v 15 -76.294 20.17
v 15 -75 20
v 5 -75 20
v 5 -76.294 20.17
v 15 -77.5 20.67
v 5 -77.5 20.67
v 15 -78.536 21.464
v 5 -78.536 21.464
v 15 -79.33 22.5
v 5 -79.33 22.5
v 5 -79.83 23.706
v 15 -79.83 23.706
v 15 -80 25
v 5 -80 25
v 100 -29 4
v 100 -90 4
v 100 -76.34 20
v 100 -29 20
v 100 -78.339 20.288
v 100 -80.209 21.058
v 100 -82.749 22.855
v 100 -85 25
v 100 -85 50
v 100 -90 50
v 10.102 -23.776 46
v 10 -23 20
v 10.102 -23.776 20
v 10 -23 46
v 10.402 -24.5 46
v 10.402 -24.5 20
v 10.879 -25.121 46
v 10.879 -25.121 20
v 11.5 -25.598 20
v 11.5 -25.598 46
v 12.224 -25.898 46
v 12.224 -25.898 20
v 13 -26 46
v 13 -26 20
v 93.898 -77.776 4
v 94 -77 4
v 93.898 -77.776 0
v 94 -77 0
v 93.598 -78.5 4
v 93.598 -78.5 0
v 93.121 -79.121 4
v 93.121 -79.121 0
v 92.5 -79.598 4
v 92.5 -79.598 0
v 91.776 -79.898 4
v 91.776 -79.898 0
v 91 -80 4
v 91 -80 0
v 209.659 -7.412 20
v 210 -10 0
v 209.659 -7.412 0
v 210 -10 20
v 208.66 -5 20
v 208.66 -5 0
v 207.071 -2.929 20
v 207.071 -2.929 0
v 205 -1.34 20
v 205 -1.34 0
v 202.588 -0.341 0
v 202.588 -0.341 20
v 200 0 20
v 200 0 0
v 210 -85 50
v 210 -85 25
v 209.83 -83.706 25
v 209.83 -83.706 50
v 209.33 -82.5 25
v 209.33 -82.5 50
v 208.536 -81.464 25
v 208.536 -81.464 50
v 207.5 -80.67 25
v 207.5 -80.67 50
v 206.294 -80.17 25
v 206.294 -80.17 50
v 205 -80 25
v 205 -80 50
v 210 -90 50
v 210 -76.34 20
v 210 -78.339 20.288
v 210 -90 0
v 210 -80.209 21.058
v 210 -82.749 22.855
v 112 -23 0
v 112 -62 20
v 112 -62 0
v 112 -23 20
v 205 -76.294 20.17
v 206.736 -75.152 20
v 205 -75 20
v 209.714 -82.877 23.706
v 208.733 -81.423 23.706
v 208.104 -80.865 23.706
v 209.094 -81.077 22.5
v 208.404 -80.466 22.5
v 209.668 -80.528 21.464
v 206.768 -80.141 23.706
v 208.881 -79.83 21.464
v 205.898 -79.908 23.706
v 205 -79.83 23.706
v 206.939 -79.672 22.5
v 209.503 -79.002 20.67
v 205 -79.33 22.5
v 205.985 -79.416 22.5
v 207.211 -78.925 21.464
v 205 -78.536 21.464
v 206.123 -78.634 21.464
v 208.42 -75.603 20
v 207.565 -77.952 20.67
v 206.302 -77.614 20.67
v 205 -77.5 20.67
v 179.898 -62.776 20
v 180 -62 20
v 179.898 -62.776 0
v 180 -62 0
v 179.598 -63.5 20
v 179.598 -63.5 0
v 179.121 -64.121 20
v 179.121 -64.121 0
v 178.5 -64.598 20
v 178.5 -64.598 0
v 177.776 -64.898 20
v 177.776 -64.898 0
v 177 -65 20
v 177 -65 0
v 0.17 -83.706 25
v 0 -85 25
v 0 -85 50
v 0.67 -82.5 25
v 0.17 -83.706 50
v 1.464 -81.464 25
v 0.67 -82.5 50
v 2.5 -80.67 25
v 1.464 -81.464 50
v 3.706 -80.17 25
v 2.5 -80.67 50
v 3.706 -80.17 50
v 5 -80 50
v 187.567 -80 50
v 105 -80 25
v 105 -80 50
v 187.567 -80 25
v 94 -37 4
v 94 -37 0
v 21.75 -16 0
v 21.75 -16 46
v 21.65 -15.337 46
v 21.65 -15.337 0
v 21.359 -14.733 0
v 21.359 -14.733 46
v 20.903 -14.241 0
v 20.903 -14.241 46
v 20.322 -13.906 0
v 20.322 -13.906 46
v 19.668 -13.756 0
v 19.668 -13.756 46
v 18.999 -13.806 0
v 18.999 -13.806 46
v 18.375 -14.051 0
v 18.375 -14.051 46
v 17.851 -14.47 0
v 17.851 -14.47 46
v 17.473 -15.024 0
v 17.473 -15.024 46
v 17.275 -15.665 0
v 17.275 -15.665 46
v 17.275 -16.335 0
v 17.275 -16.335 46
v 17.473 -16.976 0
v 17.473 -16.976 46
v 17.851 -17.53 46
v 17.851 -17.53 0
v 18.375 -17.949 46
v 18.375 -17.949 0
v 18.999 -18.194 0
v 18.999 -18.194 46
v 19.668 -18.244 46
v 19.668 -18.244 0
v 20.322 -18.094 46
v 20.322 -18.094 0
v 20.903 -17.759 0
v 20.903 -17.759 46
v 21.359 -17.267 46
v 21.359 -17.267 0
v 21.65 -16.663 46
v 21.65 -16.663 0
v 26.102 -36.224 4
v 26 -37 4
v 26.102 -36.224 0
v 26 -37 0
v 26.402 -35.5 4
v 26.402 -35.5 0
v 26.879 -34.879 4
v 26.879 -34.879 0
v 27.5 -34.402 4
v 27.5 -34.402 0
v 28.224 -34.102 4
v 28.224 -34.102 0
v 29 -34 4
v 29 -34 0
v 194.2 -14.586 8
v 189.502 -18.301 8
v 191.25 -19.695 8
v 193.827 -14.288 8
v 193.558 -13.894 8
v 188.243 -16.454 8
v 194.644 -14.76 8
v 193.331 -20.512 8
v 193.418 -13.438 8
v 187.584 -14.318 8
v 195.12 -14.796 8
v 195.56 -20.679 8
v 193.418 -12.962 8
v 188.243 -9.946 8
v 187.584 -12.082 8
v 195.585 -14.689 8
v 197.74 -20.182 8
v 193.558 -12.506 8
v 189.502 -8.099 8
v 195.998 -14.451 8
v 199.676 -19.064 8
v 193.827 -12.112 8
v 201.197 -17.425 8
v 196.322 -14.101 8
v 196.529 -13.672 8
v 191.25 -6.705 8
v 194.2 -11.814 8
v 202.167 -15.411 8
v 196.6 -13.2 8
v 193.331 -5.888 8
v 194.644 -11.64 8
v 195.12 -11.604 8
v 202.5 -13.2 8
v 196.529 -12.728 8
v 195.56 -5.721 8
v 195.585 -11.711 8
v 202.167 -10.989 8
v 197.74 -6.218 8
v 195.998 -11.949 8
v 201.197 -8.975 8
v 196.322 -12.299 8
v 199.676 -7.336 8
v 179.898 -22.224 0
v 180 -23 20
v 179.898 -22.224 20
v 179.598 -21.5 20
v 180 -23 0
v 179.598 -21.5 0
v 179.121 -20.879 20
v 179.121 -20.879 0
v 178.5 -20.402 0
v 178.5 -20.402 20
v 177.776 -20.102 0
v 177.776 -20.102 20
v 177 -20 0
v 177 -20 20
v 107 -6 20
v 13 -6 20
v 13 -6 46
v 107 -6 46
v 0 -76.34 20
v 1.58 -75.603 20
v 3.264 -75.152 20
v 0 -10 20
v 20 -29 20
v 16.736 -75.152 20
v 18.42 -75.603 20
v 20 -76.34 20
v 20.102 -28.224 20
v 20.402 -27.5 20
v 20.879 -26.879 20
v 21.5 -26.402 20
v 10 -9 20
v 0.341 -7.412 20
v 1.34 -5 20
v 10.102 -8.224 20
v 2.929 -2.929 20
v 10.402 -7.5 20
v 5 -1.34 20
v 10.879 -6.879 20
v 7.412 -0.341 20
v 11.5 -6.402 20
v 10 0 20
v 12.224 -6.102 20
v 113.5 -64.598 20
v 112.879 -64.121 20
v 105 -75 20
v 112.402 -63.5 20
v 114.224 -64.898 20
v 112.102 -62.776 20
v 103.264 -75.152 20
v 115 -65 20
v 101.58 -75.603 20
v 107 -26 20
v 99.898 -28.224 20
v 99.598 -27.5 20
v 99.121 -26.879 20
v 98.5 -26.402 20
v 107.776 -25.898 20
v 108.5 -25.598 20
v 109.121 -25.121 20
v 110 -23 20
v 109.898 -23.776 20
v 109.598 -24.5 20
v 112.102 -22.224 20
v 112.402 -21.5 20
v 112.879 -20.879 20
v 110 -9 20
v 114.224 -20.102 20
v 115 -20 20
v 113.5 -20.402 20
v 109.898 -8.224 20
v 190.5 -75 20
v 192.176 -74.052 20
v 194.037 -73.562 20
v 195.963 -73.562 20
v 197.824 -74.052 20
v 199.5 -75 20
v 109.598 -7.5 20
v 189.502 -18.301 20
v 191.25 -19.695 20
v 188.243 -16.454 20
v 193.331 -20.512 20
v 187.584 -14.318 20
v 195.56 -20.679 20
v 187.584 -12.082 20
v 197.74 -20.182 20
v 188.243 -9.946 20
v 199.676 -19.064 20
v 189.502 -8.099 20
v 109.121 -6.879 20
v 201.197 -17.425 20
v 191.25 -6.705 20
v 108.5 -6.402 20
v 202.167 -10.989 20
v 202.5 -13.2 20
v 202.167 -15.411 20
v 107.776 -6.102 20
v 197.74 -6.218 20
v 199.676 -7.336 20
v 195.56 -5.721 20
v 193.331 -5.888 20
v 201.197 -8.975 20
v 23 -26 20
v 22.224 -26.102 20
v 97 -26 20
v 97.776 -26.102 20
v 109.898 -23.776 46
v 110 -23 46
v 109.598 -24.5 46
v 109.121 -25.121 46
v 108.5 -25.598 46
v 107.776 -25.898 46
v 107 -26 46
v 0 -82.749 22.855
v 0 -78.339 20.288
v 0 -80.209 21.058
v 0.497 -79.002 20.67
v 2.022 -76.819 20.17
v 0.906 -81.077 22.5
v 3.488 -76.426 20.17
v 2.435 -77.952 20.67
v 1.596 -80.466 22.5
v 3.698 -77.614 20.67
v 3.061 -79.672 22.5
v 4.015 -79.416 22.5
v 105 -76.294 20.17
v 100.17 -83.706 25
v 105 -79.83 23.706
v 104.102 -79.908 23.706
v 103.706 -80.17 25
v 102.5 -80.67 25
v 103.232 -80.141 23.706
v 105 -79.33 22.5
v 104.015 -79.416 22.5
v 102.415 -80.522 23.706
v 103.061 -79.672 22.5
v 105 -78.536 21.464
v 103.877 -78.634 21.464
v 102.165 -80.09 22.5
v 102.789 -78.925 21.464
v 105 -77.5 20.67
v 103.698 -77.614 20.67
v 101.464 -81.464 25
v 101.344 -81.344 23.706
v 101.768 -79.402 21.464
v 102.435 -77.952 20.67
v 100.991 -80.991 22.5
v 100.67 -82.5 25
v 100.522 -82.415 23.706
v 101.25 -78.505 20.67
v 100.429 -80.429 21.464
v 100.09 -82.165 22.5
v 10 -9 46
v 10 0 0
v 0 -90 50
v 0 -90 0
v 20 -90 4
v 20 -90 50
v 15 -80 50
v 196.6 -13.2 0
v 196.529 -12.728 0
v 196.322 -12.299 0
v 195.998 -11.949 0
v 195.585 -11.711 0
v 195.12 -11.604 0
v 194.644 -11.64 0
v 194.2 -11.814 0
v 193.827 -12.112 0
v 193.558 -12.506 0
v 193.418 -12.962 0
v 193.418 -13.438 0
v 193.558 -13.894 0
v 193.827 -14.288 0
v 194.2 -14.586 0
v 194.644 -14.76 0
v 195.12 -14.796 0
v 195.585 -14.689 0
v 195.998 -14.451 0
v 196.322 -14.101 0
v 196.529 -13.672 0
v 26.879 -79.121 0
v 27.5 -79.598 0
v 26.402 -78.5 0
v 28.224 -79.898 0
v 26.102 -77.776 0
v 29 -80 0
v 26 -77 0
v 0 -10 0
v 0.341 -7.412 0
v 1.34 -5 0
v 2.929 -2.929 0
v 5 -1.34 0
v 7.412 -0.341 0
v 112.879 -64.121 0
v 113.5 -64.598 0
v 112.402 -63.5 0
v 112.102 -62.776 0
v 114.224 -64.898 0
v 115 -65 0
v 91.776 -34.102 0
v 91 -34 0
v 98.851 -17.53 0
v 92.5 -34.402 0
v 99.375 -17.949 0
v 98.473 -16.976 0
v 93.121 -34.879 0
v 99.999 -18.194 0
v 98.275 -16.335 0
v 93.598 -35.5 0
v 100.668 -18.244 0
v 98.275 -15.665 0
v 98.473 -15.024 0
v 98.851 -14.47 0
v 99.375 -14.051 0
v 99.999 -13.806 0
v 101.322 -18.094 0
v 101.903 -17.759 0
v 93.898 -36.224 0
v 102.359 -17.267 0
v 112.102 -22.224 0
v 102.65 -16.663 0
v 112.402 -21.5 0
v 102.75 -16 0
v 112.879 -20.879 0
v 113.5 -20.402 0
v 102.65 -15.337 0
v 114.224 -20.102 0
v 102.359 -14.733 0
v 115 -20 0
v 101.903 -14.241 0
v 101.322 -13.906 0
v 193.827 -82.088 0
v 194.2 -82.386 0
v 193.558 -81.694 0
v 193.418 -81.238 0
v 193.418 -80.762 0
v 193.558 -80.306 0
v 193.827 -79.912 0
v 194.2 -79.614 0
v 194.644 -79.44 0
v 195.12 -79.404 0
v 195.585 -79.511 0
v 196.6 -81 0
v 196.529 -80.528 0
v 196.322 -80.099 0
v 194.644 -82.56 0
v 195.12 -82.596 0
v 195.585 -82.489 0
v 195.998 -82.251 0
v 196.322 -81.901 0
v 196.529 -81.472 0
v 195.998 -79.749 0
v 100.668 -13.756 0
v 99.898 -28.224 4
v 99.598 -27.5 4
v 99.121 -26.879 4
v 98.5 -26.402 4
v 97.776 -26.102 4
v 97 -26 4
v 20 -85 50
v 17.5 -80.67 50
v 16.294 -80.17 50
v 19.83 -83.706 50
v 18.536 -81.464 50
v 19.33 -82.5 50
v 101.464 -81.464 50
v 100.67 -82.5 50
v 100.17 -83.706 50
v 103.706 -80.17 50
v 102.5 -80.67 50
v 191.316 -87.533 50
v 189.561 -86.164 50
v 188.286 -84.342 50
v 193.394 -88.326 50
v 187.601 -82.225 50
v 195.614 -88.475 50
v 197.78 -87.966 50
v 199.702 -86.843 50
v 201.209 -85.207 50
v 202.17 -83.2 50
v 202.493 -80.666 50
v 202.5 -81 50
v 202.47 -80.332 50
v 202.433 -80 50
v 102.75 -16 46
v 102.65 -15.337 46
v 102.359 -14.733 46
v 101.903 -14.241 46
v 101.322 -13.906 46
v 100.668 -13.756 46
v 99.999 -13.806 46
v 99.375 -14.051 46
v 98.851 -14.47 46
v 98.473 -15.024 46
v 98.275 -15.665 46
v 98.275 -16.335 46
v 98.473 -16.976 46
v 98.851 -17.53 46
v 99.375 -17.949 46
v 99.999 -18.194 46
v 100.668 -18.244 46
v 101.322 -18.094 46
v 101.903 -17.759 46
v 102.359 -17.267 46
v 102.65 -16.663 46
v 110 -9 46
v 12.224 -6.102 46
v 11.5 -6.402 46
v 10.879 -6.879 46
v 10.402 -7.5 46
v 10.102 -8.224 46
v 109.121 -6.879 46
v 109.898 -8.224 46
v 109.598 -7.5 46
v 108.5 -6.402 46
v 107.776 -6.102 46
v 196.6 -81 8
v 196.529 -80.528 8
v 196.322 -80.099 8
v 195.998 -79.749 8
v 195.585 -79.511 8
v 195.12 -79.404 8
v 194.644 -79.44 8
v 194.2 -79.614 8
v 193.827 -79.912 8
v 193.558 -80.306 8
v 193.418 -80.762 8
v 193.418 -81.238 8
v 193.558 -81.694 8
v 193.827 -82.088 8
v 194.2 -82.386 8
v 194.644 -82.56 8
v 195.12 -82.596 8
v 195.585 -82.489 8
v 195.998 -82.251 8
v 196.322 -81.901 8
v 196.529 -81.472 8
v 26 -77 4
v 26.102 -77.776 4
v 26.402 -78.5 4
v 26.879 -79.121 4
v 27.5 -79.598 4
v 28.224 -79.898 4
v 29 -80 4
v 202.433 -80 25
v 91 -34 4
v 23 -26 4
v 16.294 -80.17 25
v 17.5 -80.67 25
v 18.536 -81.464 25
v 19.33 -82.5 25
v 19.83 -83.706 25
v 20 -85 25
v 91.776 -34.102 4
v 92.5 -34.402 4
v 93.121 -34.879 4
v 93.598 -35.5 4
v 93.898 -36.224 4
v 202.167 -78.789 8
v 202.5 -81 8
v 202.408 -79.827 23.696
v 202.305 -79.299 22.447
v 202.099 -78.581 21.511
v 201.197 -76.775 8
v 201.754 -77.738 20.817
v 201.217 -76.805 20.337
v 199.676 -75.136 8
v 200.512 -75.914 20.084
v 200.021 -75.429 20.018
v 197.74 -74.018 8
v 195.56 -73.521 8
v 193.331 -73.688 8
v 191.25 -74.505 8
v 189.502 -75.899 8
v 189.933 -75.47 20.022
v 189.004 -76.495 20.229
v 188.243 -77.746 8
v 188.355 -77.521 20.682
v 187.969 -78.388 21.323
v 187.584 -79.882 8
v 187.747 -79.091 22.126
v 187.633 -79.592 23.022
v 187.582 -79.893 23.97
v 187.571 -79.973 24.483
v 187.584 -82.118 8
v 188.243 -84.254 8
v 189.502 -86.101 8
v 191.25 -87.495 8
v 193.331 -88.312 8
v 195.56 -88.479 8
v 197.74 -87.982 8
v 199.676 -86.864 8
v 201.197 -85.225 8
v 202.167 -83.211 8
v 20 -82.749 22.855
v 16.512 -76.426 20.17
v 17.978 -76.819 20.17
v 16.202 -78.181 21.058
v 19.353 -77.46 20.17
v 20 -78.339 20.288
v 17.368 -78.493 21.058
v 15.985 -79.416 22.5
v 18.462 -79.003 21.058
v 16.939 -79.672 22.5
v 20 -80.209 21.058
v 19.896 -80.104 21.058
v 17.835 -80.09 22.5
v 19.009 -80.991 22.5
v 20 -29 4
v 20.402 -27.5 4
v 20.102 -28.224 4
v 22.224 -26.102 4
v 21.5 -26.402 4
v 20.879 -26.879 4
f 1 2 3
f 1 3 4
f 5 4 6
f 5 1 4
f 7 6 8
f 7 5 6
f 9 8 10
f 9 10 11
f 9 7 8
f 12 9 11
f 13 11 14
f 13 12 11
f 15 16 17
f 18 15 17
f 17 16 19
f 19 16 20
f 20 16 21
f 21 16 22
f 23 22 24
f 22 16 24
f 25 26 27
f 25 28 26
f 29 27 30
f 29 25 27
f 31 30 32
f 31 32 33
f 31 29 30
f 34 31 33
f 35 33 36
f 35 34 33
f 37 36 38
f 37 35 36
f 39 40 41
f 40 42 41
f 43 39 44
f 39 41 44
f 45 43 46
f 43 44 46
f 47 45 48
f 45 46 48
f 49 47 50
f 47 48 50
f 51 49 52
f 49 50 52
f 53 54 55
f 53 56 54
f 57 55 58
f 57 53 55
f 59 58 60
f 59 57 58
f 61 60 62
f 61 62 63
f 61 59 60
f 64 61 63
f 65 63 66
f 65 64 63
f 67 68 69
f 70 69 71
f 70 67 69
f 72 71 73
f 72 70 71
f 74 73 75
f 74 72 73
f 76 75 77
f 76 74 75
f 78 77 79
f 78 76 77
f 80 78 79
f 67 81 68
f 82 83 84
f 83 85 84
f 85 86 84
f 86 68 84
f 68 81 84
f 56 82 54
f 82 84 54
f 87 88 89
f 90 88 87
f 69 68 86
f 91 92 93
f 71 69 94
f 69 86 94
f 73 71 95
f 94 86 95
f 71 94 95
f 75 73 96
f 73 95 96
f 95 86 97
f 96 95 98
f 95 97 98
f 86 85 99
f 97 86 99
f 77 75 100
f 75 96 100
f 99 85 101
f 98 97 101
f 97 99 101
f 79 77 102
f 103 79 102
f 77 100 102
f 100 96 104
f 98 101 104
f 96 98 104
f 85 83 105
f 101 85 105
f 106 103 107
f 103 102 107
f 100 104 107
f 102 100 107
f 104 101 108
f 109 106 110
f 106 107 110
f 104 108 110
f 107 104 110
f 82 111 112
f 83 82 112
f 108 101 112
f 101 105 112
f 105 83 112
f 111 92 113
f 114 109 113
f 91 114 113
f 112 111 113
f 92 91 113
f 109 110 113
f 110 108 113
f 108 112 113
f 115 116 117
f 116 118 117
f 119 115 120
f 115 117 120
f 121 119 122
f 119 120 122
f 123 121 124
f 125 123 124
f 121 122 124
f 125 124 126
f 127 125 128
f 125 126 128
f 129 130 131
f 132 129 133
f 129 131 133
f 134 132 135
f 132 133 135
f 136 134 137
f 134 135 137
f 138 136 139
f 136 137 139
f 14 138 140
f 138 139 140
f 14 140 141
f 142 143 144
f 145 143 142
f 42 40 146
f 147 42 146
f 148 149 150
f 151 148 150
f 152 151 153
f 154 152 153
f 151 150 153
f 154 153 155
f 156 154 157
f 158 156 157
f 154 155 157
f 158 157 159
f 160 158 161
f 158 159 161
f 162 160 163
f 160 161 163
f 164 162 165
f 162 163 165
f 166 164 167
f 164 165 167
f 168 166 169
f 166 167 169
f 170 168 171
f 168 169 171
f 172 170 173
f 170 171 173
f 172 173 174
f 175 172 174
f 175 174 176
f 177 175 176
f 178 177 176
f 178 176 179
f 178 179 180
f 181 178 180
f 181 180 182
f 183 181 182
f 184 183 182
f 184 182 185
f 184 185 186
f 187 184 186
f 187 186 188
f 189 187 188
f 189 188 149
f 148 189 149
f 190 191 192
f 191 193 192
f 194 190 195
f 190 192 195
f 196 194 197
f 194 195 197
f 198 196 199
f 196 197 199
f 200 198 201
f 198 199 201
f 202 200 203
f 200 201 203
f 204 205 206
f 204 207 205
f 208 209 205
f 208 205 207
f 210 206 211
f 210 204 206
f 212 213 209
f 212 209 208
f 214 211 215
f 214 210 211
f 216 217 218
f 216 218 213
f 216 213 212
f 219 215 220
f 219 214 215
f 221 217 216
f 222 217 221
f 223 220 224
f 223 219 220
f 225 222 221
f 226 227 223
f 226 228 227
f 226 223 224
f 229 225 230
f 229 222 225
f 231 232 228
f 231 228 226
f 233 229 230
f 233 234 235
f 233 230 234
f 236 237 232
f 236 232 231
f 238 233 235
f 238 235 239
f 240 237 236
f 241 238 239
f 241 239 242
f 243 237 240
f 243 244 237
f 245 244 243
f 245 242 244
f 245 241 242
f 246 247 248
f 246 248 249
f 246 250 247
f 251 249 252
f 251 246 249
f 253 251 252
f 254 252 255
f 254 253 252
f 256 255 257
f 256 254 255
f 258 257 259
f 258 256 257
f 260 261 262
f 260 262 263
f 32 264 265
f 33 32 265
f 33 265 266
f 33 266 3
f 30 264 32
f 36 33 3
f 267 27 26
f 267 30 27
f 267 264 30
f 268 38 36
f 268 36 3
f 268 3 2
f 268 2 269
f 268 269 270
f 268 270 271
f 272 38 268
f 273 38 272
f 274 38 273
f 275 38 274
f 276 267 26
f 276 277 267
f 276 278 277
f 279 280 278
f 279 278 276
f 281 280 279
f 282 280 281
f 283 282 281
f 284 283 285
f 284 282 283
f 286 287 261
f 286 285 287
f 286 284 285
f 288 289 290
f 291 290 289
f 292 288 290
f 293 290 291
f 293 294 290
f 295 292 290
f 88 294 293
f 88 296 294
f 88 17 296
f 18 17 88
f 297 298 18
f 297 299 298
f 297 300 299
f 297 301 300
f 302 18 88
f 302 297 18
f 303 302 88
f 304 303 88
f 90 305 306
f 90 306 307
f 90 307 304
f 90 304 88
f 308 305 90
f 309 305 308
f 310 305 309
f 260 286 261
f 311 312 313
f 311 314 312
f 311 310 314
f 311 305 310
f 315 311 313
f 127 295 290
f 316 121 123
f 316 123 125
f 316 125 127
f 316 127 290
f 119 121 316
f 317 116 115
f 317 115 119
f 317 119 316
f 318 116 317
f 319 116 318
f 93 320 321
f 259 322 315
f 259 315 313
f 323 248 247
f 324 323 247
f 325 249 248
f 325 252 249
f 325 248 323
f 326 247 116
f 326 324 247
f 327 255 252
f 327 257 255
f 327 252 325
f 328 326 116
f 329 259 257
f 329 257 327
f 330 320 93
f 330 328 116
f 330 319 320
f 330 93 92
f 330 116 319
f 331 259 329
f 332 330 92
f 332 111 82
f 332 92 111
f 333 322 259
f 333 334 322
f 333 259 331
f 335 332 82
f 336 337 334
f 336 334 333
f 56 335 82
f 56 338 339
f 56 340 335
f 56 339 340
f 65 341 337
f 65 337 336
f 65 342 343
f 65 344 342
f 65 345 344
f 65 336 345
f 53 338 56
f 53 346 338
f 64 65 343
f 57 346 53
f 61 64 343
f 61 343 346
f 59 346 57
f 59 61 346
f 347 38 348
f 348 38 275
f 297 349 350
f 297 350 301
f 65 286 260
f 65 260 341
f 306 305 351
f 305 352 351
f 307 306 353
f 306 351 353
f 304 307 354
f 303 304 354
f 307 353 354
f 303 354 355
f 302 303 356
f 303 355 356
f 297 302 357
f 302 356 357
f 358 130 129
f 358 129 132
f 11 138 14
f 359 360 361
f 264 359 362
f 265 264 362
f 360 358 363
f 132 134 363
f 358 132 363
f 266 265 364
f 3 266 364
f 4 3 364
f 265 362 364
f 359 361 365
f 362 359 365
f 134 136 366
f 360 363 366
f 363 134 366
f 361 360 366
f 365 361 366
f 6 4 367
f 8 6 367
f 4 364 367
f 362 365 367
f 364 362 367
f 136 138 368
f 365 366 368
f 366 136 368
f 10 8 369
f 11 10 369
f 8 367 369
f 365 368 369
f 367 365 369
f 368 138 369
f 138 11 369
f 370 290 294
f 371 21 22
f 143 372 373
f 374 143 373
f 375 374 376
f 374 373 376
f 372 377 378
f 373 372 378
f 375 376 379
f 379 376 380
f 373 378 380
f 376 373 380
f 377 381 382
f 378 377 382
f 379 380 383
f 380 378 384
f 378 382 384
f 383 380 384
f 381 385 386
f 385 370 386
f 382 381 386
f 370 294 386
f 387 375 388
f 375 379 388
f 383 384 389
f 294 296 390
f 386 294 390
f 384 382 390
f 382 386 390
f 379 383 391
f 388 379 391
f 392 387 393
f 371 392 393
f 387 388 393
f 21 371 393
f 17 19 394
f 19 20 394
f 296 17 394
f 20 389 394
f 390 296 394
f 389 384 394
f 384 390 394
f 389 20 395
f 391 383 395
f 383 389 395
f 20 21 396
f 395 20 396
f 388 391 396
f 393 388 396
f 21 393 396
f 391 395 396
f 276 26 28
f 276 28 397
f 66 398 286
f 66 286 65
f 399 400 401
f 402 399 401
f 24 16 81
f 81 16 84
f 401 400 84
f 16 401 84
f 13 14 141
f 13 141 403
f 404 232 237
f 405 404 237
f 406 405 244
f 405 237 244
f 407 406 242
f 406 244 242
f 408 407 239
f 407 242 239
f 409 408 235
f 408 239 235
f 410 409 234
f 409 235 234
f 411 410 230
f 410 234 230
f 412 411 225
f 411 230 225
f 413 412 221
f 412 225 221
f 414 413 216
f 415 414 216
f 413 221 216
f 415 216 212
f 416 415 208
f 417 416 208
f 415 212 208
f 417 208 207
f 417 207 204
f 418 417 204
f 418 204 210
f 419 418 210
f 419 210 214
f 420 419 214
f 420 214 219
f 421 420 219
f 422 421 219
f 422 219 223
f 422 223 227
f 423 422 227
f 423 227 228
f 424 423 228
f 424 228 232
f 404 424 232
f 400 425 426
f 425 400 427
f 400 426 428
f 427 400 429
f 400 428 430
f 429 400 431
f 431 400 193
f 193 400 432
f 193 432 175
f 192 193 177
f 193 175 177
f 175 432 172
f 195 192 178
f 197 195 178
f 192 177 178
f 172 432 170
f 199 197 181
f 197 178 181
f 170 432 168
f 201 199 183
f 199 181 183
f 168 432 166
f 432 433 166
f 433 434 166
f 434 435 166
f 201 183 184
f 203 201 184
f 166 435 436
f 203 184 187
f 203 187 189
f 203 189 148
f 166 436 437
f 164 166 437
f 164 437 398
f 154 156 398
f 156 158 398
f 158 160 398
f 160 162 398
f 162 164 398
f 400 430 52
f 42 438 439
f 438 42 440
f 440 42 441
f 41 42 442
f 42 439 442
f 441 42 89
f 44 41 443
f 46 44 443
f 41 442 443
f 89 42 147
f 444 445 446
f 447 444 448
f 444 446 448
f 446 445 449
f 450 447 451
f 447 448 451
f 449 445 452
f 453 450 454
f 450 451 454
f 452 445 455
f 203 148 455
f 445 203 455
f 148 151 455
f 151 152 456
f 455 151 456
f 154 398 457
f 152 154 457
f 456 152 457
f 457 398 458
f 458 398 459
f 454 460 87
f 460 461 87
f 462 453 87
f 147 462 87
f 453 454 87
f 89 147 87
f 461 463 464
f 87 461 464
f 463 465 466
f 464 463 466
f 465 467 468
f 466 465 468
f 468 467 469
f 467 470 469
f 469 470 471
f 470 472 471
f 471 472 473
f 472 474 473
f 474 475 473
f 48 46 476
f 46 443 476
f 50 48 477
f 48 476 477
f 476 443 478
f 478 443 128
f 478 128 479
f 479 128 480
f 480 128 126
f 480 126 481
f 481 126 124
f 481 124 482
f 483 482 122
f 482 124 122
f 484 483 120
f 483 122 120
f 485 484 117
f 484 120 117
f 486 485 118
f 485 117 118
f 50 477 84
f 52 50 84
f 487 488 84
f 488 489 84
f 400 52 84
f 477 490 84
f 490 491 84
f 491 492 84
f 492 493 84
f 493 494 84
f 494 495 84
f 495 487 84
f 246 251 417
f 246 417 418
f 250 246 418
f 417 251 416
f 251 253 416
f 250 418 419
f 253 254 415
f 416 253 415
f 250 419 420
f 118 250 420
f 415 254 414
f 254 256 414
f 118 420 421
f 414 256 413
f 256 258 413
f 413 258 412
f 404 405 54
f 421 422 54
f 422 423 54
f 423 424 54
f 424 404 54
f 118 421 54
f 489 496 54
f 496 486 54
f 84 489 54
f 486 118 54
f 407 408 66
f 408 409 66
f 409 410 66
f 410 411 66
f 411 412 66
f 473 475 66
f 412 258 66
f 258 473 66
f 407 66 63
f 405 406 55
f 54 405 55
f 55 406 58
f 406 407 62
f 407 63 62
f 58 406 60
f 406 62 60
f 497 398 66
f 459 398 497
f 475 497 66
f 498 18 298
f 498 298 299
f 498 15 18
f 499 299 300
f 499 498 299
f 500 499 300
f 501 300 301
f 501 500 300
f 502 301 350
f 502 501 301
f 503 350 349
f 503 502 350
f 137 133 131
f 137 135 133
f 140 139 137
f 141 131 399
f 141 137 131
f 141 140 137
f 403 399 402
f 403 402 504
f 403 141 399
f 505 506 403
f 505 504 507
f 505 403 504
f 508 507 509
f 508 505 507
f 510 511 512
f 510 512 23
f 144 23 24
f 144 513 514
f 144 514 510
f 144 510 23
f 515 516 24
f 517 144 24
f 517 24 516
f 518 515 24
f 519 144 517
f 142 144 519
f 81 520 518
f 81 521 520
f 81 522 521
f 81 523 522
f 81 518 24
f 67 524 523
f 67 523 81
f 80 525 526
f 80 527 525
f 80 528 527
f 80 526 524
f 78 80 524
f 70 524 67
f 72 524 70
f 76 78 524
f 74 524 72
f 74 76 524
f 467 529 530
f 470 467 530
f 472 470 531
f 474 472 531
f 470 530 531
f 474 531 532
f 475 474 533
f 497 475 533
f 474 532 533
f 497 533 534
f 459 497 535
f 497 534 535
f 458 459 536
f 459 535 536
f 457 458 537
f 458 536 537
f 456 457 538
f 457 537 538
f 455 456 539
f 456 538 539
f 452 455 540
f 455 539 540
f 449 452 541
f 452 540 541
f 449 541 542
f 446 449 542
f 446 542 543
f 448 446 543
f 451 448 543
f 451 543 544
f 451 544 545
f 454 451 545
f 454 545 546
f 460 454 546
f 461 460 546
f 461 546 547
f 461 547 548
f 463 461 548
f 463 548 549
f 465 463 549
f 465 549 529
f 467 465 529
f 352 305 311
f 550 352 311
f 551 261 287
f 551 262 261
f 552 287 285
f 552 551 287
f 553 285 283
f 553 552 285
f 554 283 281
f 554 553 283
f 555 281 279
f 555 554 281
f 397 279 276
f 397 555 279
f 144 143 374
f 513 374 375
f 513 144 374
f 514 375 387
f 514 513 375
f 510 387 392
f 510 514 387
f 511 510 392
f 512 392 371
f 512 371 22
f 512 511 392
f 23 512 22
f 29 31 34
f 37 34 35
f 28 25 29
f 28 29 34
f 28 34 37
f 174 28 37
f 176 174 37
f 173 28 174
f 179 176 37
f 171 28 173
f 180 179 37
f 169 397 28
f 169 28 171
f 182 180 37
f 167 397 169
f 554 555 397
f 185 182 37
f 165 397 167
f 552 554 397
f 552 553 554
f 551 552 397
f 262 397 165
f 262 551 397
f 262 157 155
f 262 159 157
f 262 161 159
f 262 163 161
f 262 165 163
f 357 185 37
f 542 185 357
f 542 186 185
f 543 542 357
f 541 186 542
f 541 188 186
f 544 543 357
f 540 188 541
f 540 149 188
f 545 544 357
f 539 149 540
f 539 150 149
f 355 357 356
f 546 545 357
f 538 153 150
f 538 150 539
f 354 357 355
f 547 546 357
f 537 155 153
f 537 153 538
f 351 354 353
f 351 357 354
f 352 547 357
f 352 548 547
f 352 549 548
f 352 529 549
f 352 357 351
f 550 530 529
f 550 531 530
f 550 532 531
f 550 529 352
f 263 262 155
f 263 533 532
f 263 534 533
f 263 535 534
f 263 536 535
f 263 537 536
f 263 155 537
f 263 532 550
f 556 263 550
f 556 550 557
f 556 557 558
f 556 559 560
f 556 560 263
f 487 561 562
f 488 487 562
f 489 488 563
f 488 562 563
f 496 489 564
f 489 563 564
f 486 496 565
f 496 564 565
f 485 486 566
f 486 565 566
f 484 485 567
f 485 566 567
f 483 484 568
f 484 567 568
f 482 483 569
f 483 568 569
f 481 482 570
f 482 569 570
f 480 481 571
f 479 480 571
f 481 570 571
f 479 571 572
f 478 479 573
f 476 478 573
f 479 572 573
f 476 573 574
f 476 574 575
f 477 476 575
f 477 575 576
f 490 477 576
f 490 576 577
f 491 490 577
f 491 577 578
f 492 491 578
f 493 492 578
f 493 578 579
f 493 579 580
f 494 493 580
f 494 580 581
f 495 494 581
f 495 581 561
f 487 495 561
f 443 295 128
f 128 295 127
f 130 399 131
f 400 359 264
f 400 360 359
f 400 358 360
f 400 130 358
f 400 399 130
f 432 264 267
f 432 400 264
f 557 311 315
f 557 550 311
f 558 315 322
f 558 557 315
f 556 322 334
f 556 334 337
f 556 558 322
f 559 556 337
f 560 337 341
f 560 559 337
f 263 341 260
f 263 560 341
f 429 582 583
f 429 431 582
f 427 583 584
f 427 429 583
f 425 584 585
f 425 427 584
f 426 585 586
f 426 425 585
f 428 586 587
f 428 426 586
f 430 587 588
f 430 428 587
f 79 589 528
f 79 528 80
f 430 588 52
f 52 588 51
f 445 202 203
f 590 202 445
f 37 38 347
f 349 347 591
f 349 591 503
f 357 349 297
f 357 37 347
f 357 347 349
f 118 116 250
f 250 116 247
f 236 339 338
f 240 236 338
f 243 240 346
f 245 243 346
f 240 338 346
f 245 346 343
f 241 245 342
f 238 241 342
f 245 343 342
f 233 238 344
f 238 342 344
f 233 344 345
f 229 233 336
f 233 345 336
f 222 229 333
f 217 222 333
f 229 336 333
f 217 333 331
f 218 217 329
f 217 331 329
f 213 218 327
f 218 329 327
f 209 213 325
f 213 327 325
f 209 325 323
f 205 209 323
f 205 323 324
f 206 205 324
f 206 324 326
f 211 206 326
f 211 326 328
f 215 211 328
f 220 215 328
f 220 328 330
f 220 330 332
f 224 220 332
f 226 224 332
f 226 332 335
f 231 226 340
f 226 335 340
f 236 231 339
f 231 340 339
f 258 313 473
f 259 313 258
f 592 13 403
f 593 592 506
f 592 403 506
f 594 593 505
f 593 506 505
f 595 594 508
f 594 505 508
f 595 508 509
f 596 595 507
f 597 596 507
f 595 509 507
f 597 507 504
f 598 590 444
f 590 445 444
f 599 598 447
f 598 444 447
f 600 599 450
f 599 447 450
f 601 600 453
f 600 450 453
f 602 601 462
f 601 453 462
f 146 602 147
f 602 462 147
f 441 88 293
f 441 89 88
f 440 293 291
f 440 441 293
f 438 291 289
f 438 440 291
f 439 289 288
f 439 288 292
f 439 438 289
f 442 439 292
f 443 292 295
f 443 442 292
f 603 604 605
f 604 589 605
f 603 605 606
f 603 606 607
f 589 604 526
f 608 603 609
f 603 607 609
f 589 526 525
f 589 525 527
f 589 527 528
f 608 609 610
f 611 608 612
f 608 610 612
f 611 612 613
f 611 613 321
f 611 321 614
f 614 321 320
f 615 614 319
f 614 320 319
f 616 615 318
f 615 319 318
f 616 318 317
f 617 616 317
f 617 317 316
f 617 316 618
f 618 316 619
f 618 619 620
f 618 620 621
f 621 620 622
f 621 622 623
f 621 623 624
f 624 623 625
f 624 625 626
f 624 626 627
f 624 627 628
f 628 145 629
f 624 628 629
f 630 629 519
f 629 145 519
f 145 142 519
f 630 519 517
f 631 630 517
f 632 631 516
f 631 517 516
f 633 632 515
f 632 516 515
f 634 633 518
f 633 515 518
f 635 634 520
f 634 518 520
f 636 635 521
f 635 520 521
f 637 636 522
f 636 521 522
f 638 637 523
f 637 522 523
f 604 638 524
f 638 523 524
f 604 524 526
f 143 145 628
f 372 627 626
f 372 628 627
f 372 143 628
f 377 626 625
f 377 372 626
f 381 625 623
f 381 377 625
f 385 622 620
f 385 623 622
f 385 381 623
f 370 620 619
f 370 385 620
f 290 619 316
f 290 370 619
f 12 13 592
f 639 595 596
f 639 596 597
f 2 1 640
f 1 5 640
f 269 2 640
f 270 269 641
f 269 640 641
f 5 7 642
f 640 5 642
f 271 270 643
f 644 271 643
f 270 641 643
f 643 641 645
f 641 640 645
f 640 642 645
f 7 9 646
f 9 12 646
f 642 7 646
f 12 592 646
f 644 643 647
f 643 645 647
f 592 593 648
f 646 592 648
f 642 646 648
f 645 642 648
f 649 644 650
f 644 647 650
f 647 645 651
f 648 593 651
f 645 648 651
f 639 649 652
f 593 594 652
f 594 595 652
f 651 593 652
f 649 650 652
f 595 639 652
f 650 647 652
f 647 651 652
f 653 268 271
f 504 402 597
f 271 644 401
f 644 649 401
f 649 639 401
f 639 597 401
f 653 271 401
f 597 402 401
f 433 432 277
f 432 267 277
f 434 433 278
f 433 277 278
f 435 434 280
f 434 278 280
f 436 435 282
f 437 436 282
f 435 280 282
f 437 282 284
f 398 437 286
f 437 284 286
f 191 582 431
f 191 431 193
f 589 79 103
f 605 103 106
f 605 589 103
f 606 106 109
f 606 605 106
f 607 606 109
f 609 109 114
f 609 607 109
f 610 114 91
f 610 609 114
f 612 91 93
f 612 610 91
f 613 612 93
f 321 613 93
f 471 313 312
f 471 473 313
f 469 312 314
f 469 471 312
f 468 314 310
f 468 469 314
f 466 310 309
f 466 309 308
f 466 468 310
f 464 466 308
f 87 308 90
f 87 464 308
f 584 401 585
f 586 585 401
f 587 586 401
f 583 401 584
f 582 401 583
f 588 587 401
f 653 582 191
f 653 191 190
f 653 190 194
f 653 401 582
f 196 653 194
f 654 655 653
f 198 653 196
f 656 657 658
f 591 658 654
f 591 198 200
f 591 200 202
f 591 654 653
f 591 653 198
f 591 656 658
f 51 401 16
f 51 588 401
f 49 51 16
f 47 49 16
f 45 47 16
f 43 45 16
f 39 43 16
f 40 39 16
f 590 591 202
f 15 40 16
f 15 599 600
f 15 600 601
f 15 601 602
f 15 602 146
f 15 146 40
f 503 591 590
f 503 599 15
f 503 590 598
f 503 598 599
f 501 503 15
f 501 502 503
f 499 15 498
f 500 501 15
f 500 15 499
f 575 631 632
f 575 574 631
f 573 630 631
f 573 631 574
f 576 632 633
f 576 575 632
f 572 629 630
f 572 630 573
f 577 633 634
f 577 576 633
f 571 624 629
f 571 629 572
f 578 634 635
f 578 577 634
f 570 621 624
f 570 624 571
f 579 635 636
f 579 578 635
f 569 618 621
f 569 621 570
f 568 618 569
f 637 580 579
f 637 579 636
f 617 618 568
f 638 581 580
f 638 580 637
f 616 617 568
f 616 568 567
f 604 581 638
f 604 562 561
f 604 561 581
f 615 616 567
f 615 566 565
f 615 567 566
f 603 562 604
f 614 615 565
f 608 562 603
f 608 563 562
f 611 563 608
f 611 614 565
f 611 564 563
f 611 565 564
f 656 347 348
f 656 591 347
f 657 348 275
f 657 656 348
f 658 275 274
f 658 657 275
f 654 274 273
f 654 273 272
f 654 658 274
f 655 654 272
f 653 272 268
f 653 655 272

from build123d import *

# Parameters (mm, degrees)
SKETCH1_W           = 210
SKETCH1_H           = 90
BOSS_EXTRUDE1_DEPTH = 20
SKETCH2_R           = 1.6
CUT_EXTRUDE1_DEPTH  = 20
SKETCH3_W           = 110
SKETCH3_H           = 10
BOSS_EXTRUDE2_DEPTH = 30
SKETCH4_W           = 100
SKETCH4_H           = 20
BOSS_EXTRUDE3_DEPTH = 26
SKETCH5_R           = 2.25
CUT_EXTRUDE2_DEPTH  = 234.057932712
SKETCH7_W           = 80
SKETCH7_H           = 64
CUT_EXTRUDE3_DEPTH  = 16
SKETCH8_R           = 7.5
CUT_EXTRUDE4_DEPTH  = 12
SKETCH9_R           = 7.5
CUT_EXTRUDE5_DEPTH  = 42
SKETCH10_W          = 68
SKETCH10_H          = 45
CUT_EXTRUDE6_DEPTH  = 46
SKETCH11_W          = 20
SKETCH11_H          = 10
BOSS_EXTRUDE5_DEPTH = 30
FILLET1_R           = 10
SKETCH12_W          = 68
SKETCH12_H          = 46
CUT_EXTRUDE7_DEPTH  = 30
FILLET2_R           = 5
FILLET3_R           = 5
FILLET4_R           = 3
FILLET5_R           = 3


with BuildPart() as part:
    # Sketch1 → Boss-Extrude1 (new body)
    with BuildSketch(Plane.XY):
        with Locations((105, -45)):
            Rectangle(SKETCH1_W, SKETCH1_H)
    extrude(amount=BOSS_EXTRUDE1_DEPTH)

    # Sketch2 → Cut-Extrude1 (cut)
    with BuildSketch(Plane.XY.offset(20)):
        with Locations((195, -13.2)):
            Circle(SKETCH2_R)
        with Locations((195, -81)):
            Circle(SKETCH2_R)
    extrude(amount=-CUT_EXTRUDE1_DEPTH, mode=Mode.SUBTRACT)

    # Sketch3 → Boss-Extrude2 (add)
    with BuildSketch(Plane.XY.offset(20)):
        with Locations((155, -85)):
            Rectangle(SKETCH3_W, SKETCH3_H)
    extrude(amount=BOSS_EXTRUDE2_DEPTH)

    # Sketch4 → Boss-Extrude3 (add)
    with BuildSketch(Plane.XY.offset(20)):
        with Locations((60, -16)):
            Rectangle(SKETCH4_W, SKETCH4_H)
    extrude(amount=BOSS_EXTRUDE3_DEPTH)

    # Sketch5 → Cut-Extrude2 (cut, through all)
    with BuildSketch(Plane.XY.offset(46)):
        with Locations((100.5, -16)):
            Circle(SKETCH5_R)
        with Locations((19.5, -16)):
            Circle(SKETCH5_R)
    extrude(amount=-CUT_EXTRUDE2_DEPTH, mode=Mode.SUBTRACT)

    # Sketch7 → Cut-Extrude3 (cut)
    with BuildSketch(Plane.XY.offset(20)):
        with Locations((60, -58)):
            Rectangle(SKETCH7_W, SKETCH7_H)
    extrude(amount=-CUT_EXTRUDE3_DEPTH, mode=Mode.SUBTRACT)

    # Sketch8 → Cut-Extrude4 (cut)
    with BuildSketch(Plane.XY.offset(20)):
        with Locations((195, -13.2)):
            Circle(SKETCH8_R)
    extrude(amount=-CUT_EXTRUDE4_DEPTH, mode=Mode.SUBTRACT)

    # Sketch9 → Cut-Extrude5 (cut)
    with BuildSketch(Plane.XY.offset(50)):
        with Locations((195, -81)):
            Circle(SKETCH9_R)
    extrude(amount=-CUT_EXTRUDE5_DEPTH, mode=Mode.SUBTRACT)

    # Sketch10 → Cut-Extrude6 (cut)
    with BuildSketch(Plane.XY.offset(20)):
        with Locations((146, -42.5)):
            Rectangle(SKETCH10_W, SKETCH10_H)
    extrude(amount=-CUT_EXTRUDE6_DEPTH, mode=Mode.SUBTRACT)

    # Sketch11 → Boss-Extrude5 (add)
    with BuildSketch(Plane.XY.offset(20)):
        with Locations((10, -85)):
            Rectangle(SKETCH11_W, SKETCH11_H)
    extrude(amount=BOSS_EXTRUDE5_DEPTH)

    # Fillet1
    fillet1_edges = [part.edges().sort_by_distance(p)[0] for p in [
        (0, 0, 10),
        (210, 0, 10),
    ]]
    fillet(fillet1_edges, radius=FILLET1_R)

    # Sketch12 → Cut-Extrude7 (cut)
    with BuildSketch(Plane.XY.offset(4)):
        with Locations((60, -57)):
            Rectangle(SKETCH12_W, SKETCH12_H)
    extrude(amount=-CUT_EXTRUDE7_DEPTH, mode=Mode.SUBTRACT)

    # Fillet2
    fillet2_edges = [part.edges().sort_by_distance(p)[0] for p in [
        (0, -80, 35),
        (20, -80, 35),
        (210, -80, 35),
        (100, -80, 35),
    ]]
    fillet(fillet2_edges, radius=FILLET2_R)

    # Fillet3
    # the kernel refuses this fillet: 5 mm, written as the material it adds along each edge
    with BuildSketch(Plane(origin=(189.933034374, -80, 20), x_dir=(0, 1, 0), z_dir=(1, 0, 0))) as fillet3_piece_1_section:
        with BuildLine():
            CenterArc((FILLET3_R, FILLET3_R), FILLET3_R, 180, 90)
            Line((0, FILLET3_R), (0, 0))
            Line((0, 0), (FILLET3_R, 0))
        make_face()
    fillet3_piece_1 = extrude(amount=15.066965626, mode=Mode.PRIVATE)
    fillet3_piece_1 = fillet3_piece_1 - Plane(origin=(195, -81, 20.004383527), x_dir=(1, 0, 0), z_dir=(0, 0, 1)) * Cylinder(7.5, 51, mode=Mode.PRIVATE)
    add(fillet3_piece_1)
    with BuildSketch(Plane(origin=(15, -80, 20), x_dir=(0, 1, 0), z_dir=(-1, 0, 0))) as fillet3_piece_2:
        with BuildLine():
            CenterArc((FILLET3_R, -FILLET3_R), FILLET3_R, 90, 90)
            Line((0, -FILLET3_R), (0, 0))
            Line((0, 0), (FILLET3_R, 0))
        make_face()
    extrude(amount=10)
    with BuildSketch(Plane(origin=(205, -85, 20), x_dir=(-0.801744239297649, -0.5976672776328267, 0), z_dir=(-0.5976672776328267, 0.801744239297649, 0))) as fillet3_piece_3_section:
        with BuildLine():
            CenterArc((5 + FILLET3_R, FILLET3_R), FILLET3_R, 180, 90)
            Line((5, FILLET3_R), (5, 0))
            Line((5, 0), (5 + FILLET3_R, 0))
        make_face()
    fillet3_piece_3 = revolve(axis=Axis((205, -85, 20), (0, 0, 1)), revolution_arc=233.296989237, mode=Mode.PRIVATE)
    fillet3_piece_3 = split(fillet3_piece_3, bisect_by=Plane(origin=(208.749694825, -90, 21.558141558), z_dir=(0, 1, 0)), keep=Keep.TOP, mode=Mode.PRIVATE)
    fillet3_piece_3 = split(fillet3_piece_3, bisect_by=Plane(origin=(210, -81.250305307, 21.558141558), z_dir=(-1, 0, 0)), keep=Keep.TOP, mode=Mode.PRIVATE)
    add(fillet3_piece_3)
    with BuildSketch(Plane(origin=(105, -85, 20), x_dir=(0, 1, 0), z_dir=(1, 0, 0))) as fillet3_piece_4_section:
        with BuildLine():
            CenterArc((5 + FILLET3_R, FILLET3_R), FILLET3_R, 180, 90)
            Line((5, FILLET3_R), (5, 0))
            Line((5, 0), (5 + FILLET3_R, 0))
        make_face()
    fillet3_piece_4 = revolve(axis=Axis((105, -85, 20), (0, 0, 1)), revolution_arc=233.296989237, mode=Mode.PRIVATE)
    fillet3_piece_4 = split(fillet3_piece_4, bisect_by=Plane(origin=(103.049091377, -90, 20.836500951), z_dir=(0, 1, 0)), keep=Keep.TOP, mode=Mode.PRIVATE)
    fillet3_piece_4 = split(fillet3_piece_4, bisect_by=Plane(origin=(100, -78.901123736, 20.836500951), z_dir=(1, 0, 0)), keep=Keep.TOP, mode=Mode.PRIVATE)
    add(fillet3_piece_4)
    with BuildSketch(Plane(origin=(15, -85, 20), x_dir=(0, 1, 0), z_dir=(-1, 0, 0))) as fillet3_piece_5_section:
        with BuildLine():
            CenterArc((5 + FILLET3_R, -FILLET3_R), FILLET3_R, 90, 90)
            Line((5, -FILLET3_R), (5, 0))
            Line((5, 0), (5 + FILLET3_R, 0))
        make_face()
    fillet3_piece_5 = revolve(axis=Axis((15, -85, 20), (0, 0, -1)), revolution_arc=233.296989237, mode=Mode.PRIVATE)
    fillet3_piece_5 = split(fillet3_piece_5, bisect_by=Plane(origin=(16.950908623, -90, 20.836500951), z_dir=(0, 1, 0)), keep=Keep.TOP, mode=Mode.PRIVATE)
    fillet3_piece_5 = split(fillet3_piece_5, bisect_by=Plane(origin=(20, -78.901123736, 20.836500951), z_dir=(-1, 0, 0)), keep=Keep.TOP, mode=Mode.PRIVATE)
    add(fillet3_piece_5)
    with BuildSketch(Plane(origin=(5, -85, 20), x_dir=(0.8017442392976476, -0.5976672776328283, 0), z_dir=(0.5976672776328283, 0.8017442392976476, 0))) as fillet3_piece_6_section:
        with BuildLine():
            CenterArc((5 + FILLET3_R, -FILLET3_R), FILLET3_R, 90, 90)
            Line((5, -FILLET3_R), (5, 0))
            Line((5, 0), (5 + FILLET3_R, 0))
        make_face()
    fillet3_piece_6 = revolve(axis=Axis((5, -85, 20), (0, 0, -1)), revolution_arc=233.296989237, mode=Mode.PRIVATE)
    fillet3_piece_6 = split(fillet3_piece_6, bisect_by=Plane(origin=(1.250305308, -90, 21.55814164), z_dir=(0, 1, 0)), keep=Keep.TOP, mode=Mode.PRIVATE)
    fillet3_piece_6 = split(fillet3_piece_6, bisect_by=Plane(origin=(0, -81.250305308, 21.55814164), z_dir=(1, 0, 0)), keep=Keep.TOP, mode=Mode.PRIVATE)
    add(fillet3_piece_6)
    with BuildSketch(Plane(origin=(105, -80, 20), x_dir=(0, 1, 0), z_dir=(1, 0, 0))) as fillet3_piece_7_section:
        with BuildLine():
            CenterArc((FILLET3_R, FILLET3_R), FILLET3_R, 180, 90)
            Line((0, FILLET3_R), (0, 0))
            Line((0, 0), (FILLET3_R, 0))
        make_face()
    fillet3_piece_7 = extrude(amount=95.066965626, mode=Mode.PRIVATE)
    fillet3_piece_7 = fillet3_piece_7 - Plane(origin=(195, -81, 21.114667371), x_dir=(1, 0, 0), z_dir=(0, 0, 1)) * Cylinder(7.5, 211, mode=Mode.PRIVATE)
    add(fillet3_piece_7)

    # Fillet4
    fillet4_edges = [part.edges().sort_by_distance(p)[0] for p in [
        (180, -20, 10),
        (180, -65, 10),
        (26, -80, 2),
        (26, -34, 2),
        (94, -34, 2),
        (94, -80, 2),
        (20, -26, 12),
        (100, -26, 12),
        (112, -65, 10),
        (112, -20, 10),
    ]]
    fillet(fillet4_edges, radius=FILLET4_R)

    # Fillet5
    fillet5_edges = [part.edges().sort_by_distance(p)[0] for p in [
        (10, -6, 33),
        (10, -26, 33),
        (110, -26, 33),
        (110, -6, 33),
    ]]
    fillet(fillet5_edges, radius=FILLET5_R)


solid = part.part
